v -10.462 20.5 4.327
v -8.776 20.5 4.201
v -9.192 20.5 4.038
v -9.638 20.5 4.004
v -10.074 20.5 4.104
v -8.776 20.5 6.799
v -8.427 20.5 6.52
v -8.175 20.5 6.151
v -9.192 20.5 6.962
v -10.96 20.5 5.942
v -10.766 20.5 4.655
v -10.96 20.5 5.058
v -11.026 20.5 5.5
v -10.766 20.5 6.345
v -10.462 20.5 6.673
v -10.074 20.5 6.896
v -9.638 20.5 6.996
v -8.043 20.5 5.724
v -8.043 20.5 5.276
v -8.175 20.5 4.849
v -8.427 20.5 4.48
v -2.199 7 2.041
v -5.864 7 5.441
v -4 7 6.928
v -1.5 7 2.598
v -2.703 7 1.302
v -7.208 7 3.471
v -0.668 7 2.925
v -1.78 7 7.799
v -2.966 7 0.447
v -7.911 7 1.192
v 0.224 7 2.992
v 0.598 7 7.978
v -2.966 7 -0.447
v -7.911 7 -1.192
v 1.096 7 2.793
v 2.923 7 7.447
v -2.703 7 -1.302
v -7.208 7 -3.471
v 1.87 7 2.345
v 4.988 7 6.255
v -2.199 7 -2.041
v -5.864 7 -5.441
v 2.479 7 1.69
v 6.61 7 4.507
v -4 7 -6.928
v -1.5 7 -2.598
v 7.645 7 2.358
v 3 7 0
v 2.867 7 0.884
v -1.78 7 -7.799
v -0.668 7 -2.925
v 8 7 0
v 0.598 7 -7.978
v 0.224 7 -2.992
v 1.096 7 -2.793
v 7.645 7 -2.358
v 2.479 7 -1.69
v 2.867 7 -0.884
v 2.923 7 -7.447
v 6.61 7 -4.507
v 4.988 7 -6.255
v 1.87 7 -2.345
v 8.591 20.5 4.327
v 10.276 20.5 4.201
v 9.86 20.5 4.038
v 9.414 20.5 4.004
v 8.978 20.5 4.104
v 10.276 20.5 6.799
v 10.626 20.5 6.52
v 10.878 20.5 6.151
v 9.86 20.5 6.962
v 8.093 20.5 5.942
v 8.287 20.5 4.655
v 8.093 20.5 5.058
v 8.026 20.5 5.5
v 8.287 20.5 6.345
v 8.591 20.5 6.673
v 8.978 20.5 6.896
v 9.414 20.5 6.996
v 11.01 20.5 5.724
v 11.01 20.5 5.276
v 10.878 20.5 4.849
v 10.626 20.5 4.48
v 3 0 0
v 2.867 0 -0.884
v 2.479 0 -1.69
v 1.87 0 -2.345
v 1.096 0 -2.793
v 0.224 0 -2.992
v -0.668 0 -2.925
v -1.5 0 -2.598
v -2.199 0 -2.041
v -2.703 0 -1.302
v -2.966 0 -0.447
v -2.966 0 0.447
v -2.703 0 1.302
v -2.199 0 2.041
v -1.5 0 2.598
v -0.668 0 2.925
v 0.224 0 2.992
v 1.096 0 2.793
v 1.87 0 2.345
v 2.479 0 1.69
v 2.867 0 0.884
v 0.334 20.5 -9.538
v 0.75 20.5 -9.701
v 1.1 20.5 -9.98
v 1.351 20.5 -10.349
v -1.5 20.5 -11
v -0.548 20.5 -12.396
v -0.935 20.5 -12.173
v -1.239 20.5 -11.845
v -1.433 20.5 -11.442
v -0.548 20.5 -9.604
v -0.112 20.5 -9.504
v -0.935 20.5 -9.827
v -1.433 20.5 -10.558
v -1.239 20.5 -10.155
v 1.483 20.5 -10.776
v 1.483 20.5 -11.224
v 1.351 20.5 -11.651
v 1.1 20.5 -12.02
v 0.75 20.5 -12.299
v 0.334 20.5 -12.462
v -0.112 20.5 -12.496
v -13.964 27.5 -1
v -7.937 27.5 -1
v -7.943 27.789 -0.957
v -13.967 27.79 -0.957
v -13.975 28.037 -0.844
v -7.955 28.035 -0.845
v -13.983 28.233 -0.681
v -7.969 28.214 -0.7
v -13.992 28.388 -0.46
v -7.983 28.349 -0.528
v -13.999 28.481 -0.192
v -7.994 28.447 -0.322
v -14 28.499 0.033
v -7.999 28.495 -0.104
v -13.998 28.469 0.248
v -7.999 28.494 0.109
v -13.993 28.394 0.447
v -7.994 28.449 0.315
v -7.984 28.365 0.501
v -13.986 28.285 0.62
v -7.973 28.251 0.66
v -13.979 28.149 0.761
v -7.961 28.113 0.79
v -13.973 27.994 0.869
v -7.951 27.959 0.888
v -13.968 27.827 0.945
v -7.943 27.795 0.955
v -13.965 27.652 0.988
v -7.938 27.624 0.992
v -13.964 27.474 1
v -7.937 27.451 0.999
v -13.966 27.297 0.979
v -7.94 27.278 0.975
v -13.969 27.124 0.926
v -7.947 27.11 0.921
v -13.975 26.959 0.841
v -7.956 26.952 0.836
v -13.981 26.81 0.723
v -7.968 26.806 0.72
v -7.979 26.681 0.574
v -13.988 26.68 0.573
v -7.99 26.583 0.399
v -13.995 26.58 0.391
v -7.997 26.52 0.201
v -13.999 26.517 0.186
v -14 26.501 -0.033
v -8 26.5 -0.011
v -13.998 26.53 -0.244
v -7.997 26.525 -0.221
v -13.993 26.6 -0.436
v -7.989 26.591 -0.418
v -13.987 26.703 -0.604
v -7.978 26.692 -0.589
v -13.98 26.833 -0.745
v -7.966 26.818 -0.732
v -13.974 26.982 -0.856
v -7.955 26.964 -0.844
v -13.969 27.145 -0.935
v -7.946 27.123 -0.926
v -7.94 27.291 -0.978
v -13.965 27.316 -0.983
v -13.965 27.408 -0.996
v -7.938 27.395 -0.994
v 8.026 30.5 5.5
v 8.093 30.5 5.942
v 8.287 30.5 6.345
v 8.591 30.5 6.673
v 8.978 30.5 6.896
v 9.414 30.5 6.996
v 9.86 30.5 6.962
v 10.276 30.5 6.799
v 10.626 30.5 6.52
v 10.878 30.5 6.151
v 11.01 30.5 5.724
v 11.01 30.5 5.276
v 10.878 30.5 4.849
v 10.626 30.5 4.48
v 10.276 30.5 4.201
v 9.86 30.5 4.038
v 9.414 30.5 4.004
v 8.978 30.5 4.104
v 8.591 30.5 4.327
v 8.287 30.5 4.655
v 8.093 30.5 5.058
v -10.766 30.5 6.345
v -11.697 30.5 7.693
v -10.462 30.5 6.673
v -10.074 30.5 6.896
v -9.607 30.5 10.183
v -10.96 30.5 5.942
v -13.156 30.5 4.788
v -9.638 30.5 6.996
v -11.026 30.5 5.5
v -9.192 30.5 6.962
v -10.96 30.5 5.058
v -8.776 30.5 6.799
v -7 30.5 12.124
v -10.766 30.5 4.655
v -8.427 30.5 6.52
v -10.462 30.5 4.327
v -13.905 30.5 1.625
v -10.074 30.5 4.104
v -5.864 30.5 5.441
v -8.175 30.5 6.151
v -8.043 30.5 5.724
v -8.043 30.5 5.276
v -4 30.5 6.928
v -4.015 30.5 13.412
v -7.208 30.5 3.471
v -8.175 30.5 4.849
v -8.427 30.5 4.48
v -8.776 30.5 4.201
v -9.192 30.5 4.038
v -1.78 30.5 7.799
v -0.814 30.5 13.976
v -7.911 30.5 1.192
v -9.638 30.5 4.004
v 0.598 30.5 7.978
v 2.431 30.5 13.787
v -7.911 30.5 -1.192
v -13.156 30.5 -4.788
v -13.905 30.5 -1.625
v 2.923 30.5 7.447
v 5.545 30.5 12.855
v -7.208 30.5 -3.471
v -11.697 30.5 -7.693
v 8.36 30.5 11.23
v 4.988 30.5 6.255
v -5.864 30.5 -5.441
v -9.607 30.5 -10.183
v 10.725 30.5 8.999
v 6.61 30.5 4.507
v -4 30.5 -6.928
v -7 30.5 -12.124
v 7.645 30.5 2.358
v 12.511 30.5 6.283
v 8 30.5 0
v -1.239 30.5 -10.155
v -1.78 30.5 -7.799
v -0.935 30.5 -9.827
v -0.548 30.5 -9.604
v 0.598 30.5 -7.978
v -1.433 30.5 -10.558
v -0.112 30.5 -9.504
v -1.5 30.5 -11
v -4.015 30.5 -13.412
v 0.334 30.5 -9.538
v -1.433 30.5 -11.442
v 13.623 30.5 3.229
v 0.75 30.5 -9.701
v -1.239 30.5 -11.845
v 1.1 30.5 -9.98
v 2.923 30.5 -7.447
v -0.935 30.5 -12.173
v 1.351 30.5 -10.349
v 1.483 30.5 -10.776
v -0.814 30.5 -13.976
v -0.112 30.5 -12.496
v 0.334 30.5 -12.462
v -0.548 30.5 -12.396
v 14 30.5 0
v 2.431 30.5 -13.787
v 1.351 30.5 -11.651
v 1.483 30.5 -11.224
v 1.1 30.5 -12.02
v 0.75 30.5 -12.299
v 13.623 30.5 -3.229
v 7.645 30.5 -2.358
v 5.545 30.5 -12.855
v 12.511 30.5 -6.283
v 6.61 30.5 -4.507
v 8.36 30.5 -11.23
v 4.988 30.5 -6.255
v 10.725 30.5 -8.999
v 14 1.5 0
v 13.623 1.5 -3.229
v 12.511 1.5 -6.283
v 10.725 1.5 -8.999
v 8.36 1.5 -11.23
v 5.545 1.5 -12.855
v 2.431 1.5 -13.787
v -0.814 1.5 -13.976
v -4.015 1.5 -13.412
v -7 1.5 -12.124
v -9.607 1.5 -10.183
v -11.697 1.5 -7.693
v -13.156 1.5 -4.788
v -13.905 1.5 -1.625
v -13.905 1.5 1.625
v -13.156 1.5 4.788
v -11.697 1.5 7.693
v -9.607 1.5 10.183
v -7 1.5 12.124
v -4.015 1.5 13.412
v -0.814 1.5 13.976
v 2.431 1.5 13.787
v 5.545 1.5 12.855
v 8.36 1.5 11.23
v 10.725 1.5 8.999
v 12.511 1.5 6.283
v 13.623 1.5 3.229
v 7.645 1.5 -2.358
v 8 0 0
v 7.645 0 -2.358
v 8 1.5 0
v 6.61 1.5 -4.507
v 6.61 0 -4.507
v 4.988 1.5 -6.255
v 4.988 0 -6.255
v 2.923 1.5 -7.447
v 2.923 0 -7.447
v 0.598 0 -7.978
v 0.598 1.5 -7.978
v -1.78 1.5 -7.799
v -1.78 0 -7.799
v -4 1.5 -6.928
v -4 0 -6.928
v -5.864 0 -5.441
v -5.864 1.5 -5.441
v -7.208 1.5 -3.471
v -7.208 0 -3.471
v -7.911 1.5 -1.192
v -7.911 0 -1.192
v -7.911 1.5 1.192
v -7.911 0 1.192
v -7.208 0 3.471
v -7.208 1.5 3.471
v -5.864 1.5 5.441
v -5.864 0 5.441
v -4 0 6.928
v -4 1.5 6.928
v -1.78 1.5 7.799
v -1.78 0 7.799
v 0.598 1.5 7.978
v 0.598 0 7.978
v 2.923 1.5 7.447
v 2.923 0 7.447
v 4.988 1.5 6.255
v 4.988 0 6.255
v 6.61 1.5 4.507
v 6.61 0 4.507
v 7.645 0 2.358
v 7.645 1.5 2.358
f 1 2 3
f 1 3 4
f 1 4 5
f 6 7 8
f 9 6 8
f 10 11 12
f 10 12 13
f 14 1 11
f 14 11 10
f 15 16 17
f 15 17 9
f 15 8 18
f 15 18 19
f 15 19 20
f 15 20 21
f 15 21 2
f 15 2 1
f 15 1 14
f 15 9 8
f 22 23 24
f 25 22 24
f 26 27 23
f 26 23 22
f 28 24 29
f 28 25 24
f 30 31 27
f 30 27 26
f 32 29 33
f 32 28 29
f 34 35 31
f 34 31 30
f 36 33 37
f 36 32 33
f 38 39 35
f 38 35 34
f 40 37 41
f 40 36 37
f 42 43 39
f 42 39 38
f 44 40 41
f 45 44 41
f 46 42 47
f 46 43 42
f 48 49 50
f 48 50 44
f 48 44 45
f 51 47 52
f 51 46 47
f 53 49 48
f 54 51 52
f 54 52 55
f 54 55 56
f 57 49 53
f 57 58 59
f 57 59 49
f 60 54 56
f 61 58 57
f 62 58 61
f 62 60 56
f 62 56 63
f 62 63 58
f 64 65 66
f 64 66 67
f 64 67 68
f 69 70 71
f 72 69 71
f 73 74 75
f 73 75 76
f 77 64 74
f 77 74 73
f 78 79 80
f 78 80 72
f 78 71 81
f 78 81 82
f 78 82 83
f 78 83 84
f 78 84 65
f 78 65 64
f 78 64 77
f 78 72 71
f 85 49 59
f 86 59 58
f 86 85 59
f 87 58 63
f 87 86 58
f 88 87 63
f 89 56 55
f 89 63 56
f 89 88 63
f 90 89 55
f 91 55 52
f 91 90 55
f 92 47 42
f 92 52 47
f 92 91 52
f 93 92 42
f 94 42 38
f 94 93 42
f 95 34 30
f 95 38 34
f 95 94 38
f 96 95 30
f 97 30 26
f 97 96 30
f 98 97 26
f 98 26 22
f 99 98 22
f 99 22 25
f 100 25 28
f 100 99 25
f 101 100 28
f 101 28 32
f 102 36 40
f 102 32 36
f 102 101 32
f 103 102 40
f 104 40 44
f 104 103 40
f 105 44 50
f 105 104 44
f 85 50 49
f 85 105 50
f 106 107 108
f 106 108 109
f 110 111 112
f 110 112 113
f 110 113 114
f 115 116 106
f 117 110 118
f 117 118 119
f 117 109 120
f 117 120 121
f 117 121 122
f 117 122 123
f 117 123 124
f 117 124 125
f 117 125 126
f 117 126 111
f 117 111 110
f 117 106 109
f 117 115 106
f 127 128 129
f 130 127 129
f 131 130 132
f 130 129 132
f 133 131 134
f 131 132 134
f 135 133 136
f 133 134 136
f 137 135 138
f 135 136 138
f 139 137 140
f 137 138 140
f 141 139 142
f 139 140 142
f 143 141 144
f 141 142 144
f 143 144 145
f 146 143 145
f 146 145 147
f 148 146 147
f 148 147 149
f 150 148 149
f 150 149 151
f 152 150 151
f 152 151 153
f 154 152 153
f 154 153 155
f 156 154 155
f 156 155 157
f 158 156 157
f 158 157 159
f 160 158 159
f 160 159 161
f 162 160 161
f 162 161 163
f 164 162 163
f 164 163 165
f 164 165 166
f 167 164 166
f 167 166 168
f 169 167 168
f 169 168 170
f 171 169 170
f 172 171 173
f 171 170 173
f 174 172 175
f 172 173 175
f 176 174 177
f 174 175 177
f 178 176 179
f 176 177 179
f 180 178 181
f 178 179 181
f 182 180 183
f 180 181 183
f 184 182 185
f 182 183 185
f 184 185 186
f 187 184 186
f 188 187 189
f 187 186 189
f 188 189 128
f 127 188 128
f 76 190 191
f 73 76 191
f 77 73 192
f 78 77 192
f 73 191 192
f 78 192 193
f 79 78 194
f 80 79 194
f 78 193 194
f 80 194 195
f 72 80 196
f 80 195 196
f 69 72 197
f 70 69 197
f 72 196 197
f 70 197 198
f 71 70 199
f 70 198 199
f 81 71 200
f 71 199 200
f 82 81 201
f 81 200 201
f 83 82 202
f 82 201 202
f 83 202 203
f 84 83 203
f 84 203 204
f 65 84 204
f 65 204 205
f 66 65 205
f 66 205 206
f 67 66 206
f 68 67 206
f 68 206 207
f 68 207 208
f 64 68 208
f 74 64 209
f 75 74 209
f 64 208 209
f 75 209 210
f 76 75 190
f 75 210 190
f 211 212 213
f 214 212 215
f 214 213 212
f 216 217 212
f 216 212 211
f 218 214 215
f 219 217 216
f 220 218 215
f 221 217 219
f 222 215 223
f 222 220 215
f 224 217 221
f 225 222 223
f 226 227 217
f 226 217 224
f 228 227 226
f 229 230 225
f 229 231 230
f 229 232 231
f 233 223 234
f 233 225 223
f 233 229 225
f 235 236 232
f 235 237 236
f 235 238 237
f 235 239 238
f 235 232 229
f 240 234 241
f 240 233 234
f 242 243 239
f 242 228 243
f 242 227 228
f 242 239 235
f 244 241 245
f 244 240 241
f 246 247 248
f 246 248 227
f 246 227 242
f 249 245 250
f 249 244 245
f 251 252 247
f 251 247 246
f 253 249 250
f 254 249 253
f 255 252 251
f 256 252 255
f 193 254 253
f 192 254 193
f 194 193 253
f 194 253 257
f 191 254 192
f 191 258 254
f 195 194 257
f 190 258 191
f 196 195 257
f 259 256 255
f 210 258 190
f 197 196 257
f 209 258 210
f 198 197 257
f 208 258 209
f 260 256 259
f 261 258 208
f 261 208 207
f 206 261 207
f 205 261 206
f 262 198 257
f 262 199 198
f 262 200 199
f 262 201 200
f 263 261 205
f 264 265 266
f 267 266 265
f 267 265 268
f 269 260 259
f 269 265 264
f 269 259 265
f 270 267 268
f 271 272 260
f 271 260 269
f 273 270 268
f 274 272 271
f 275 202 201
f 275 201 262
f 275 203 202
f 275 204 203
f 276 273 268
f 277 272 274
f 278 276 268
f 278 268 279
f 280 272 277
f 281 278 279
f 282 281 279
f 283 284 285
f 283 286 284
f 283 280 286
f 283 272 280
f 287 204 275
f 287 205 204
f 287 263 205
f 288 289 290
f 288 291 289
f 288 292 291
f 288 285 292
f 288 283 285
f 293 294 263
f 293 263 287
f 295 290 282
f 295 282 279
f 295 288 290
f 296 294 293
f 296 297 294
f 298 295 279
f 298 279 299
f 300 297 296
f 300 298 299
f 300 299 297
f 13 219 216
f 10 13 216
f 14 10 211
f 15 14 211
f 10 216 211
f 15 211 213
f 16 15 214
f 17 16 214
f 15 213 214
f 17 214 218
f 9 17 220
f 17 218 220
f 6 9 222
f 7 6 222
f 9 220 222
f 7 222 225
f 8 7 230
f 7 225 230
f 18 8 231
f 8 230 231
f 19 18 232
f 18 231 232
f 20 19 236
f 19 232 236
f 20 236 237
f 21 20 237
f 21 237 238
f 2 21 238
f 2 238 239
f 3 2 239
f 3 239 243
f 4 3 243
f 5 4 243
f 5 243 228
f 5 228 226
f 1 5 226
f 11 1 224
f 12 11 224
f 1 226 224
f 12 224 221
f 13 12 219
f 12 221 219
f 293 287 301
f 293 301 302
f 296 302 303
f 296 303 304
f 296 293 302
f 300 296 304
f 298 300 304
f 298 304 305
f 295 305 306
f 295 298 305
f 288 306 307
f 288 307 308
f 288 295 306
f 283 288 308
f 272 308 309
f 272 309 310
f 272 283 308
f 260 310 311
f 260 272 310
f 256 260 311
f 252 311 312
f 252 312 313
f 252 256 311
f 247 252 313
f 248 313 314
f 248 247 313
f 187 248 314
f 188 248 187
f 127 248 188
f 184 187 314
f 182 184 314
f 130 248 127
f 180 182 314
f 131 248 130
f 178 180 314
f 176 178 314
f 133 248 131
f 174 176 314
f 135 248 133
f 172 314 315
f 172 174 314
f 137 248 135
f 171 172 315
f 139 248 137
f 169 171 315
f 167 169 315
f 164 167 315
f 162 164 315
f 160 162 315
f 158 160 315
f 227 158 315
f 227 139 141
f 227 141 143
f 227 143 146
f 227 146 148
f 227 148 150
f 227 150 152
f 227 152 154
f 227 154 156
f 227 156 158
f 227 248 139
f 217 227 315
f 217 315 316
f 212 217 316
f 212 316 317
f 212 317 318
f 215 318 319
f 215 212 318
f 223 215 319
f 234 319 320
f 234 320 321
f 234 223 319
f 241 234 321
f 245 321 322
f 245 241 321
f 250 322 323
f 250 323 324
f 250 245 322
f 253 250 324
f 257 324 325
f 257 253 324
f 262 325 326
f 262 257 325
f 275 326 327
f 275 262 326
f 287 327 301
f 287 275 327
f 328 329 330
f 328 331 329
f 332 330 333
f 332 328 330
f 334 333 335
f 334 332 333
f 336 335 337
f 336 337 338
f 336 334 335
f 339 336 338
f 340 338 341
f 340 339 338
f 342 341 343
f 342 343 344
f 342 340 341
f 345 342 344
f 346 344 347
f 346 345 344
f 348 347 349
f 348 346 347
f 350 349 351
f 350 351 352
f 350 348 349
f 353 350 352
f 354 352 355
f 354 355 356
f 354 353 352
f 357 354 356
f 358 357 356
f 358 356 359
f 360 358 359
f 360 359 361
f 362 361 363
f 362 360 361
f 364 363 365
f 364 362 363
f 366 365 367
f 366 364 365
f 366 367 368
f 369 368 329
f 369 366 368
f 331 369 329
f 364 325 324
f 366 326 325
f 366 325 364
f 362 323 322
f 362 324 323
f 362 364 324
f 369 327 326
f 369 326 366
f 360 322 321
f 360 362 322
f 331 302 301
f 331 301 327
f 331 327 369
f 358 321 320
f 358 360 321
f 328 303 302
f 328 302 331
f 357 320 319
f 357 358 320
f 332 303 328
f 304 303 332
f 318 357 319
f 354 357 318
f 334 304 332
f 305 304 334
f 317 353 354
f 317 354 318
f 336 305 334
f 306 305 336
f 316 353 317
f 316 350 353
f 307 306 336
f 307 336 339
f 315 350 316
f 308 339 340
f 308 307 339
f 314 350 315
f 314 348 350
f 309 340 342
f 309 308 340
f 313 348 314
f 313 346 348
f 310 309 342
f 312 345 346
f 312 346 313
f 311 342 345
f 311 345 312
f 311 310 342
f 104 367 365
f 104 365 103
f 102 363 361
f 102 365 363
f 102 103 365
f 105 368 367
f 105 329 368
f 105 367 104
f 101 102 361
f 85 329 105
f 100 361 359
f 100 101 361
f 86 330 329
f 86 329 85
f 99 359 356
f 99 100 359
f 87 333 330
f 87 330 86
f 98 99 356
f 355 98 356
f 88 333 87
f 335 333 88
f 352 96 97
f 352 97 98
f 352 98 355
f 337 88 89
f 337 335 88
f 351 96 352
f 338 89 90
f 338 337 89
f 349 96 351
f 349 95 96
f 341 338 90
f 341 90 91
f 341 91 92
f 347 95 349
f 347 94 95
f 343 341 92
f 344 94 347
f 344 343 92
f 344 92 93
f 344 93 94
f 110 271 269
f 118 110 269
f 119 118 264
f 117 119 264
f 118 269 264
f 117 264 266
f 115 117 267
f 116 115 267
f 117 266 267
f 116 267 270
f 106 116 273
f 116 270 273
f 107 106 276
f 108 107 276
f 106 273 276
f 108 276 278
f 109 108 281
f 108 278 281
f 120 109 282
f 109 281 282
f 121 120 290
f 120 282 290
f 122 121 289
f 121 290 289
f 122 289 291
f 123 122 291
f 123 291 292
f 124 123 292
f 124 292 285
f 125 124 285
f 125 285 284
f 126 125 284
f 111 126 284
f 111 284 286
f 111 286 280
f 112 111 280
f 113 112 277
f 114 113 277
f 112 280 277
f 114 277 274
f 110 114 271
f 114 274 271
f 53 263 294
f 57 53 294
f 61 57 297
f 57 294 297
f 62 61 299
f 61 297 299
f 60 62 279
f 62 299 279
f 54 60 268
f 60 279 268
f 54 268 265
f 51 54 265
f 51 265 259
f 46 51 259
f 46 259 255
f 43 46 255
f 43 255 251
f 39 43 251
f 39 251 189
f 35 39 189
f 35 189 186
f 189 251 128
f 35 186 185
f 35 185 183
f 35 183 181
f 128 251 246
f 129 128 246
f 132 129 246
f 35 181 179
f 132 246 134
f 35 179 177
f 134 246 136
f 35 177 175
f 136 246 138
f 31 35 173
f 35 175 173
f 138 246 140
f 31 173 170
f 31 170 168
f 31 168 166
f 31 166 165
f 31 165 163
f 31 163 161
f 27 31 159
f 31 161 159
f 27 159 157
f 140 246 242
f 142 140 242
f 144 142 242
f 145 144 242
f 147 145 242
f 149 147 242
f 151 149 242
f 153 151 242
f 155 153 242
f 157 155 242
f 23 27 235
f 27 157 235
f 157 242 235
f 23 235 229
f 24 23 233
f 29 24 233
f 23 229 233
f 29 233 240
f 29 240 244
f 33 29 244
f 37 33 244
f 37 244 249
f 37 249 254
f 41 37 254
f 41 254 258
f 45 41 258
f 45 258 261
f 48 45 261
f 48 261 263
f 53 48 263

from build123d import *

# Parameters (mm, degrees)
ESQUISSE2_R             = 1.5
ENL_V_MAT_EXTRU_1_DEPTH = 10
ESQUISSE3_R             = 8
ENL_V_MAT_EXTRU_2_DEPTH = 25
ESQUISSE4_R             = 1
ENL_V_MAT_EXTRU_3_DEPTH = 25


with BuildPart() as part:
    # Esquisse1 → Révolution1 (revolve)
    with BuildSketch(Plane.XY):
        Polygon((8, 0), (8, 1.5), (14, 1.5), (14, 30.5), (8, 30.5), (8, 32), (3, 32), (3, 0), align=None)
    revolve(axis=Axis((0, 0, 0), (0, 1, 0)))

    # Esquisse2 → Enlèv. mat.-Extru.1 (cut)
    with BuildSketch(Plane(origin=(0, 30.5, 0), x_dir=(1, 0, 0), z_dir=(0, 1, 0))):
        with Locations(Location((0, 11, 0), (0, 0, 180))):
            Circle(ESQUISSE2_R)
        with Locations(Location((9.526279442, -5.5, 0), (0, 0, 180))):
            Circle(ESQUISSE2_R)
        with Locations(Location((-9.526279442, -5.5, 0), (0, 0, 180))):
            Circle(ESQUISSE2_R)
    extrude(amount=-ENL_V_MAT_EXTRU_1_DEPTH, mode=Mode.SUBTRACT)

    # Esquisse3 → Enlèv. mat.-Extru.2 (cut)
    with BuildSketch(Plane(origin=(0, 32, 0), x_dir=(1, 0, 0), z_dir=(0, 1, 0))):
        Circle(ESQUISSE3_R)
    extrude(amount=-ENL_V_MAT_EXTRU_2_DEPTH, mode=Mode.SUBTRACT)

    # Esquisse4 → Enlèv. mat.-Extru.3 (cut)
    with BuildSketch(Plane(origin=(0, 0, 0), x_dir=(0, 0, -1), z_dir=(1, 0, 0))):
        with Locations((0, 27.5)):
            Circle(ESQUISSE4_R)
    extrude(amount=-ENL_V_MAT_EXTRU_3_DEPTH, mode=Mode.SUBTRACT)


solid = part.part
